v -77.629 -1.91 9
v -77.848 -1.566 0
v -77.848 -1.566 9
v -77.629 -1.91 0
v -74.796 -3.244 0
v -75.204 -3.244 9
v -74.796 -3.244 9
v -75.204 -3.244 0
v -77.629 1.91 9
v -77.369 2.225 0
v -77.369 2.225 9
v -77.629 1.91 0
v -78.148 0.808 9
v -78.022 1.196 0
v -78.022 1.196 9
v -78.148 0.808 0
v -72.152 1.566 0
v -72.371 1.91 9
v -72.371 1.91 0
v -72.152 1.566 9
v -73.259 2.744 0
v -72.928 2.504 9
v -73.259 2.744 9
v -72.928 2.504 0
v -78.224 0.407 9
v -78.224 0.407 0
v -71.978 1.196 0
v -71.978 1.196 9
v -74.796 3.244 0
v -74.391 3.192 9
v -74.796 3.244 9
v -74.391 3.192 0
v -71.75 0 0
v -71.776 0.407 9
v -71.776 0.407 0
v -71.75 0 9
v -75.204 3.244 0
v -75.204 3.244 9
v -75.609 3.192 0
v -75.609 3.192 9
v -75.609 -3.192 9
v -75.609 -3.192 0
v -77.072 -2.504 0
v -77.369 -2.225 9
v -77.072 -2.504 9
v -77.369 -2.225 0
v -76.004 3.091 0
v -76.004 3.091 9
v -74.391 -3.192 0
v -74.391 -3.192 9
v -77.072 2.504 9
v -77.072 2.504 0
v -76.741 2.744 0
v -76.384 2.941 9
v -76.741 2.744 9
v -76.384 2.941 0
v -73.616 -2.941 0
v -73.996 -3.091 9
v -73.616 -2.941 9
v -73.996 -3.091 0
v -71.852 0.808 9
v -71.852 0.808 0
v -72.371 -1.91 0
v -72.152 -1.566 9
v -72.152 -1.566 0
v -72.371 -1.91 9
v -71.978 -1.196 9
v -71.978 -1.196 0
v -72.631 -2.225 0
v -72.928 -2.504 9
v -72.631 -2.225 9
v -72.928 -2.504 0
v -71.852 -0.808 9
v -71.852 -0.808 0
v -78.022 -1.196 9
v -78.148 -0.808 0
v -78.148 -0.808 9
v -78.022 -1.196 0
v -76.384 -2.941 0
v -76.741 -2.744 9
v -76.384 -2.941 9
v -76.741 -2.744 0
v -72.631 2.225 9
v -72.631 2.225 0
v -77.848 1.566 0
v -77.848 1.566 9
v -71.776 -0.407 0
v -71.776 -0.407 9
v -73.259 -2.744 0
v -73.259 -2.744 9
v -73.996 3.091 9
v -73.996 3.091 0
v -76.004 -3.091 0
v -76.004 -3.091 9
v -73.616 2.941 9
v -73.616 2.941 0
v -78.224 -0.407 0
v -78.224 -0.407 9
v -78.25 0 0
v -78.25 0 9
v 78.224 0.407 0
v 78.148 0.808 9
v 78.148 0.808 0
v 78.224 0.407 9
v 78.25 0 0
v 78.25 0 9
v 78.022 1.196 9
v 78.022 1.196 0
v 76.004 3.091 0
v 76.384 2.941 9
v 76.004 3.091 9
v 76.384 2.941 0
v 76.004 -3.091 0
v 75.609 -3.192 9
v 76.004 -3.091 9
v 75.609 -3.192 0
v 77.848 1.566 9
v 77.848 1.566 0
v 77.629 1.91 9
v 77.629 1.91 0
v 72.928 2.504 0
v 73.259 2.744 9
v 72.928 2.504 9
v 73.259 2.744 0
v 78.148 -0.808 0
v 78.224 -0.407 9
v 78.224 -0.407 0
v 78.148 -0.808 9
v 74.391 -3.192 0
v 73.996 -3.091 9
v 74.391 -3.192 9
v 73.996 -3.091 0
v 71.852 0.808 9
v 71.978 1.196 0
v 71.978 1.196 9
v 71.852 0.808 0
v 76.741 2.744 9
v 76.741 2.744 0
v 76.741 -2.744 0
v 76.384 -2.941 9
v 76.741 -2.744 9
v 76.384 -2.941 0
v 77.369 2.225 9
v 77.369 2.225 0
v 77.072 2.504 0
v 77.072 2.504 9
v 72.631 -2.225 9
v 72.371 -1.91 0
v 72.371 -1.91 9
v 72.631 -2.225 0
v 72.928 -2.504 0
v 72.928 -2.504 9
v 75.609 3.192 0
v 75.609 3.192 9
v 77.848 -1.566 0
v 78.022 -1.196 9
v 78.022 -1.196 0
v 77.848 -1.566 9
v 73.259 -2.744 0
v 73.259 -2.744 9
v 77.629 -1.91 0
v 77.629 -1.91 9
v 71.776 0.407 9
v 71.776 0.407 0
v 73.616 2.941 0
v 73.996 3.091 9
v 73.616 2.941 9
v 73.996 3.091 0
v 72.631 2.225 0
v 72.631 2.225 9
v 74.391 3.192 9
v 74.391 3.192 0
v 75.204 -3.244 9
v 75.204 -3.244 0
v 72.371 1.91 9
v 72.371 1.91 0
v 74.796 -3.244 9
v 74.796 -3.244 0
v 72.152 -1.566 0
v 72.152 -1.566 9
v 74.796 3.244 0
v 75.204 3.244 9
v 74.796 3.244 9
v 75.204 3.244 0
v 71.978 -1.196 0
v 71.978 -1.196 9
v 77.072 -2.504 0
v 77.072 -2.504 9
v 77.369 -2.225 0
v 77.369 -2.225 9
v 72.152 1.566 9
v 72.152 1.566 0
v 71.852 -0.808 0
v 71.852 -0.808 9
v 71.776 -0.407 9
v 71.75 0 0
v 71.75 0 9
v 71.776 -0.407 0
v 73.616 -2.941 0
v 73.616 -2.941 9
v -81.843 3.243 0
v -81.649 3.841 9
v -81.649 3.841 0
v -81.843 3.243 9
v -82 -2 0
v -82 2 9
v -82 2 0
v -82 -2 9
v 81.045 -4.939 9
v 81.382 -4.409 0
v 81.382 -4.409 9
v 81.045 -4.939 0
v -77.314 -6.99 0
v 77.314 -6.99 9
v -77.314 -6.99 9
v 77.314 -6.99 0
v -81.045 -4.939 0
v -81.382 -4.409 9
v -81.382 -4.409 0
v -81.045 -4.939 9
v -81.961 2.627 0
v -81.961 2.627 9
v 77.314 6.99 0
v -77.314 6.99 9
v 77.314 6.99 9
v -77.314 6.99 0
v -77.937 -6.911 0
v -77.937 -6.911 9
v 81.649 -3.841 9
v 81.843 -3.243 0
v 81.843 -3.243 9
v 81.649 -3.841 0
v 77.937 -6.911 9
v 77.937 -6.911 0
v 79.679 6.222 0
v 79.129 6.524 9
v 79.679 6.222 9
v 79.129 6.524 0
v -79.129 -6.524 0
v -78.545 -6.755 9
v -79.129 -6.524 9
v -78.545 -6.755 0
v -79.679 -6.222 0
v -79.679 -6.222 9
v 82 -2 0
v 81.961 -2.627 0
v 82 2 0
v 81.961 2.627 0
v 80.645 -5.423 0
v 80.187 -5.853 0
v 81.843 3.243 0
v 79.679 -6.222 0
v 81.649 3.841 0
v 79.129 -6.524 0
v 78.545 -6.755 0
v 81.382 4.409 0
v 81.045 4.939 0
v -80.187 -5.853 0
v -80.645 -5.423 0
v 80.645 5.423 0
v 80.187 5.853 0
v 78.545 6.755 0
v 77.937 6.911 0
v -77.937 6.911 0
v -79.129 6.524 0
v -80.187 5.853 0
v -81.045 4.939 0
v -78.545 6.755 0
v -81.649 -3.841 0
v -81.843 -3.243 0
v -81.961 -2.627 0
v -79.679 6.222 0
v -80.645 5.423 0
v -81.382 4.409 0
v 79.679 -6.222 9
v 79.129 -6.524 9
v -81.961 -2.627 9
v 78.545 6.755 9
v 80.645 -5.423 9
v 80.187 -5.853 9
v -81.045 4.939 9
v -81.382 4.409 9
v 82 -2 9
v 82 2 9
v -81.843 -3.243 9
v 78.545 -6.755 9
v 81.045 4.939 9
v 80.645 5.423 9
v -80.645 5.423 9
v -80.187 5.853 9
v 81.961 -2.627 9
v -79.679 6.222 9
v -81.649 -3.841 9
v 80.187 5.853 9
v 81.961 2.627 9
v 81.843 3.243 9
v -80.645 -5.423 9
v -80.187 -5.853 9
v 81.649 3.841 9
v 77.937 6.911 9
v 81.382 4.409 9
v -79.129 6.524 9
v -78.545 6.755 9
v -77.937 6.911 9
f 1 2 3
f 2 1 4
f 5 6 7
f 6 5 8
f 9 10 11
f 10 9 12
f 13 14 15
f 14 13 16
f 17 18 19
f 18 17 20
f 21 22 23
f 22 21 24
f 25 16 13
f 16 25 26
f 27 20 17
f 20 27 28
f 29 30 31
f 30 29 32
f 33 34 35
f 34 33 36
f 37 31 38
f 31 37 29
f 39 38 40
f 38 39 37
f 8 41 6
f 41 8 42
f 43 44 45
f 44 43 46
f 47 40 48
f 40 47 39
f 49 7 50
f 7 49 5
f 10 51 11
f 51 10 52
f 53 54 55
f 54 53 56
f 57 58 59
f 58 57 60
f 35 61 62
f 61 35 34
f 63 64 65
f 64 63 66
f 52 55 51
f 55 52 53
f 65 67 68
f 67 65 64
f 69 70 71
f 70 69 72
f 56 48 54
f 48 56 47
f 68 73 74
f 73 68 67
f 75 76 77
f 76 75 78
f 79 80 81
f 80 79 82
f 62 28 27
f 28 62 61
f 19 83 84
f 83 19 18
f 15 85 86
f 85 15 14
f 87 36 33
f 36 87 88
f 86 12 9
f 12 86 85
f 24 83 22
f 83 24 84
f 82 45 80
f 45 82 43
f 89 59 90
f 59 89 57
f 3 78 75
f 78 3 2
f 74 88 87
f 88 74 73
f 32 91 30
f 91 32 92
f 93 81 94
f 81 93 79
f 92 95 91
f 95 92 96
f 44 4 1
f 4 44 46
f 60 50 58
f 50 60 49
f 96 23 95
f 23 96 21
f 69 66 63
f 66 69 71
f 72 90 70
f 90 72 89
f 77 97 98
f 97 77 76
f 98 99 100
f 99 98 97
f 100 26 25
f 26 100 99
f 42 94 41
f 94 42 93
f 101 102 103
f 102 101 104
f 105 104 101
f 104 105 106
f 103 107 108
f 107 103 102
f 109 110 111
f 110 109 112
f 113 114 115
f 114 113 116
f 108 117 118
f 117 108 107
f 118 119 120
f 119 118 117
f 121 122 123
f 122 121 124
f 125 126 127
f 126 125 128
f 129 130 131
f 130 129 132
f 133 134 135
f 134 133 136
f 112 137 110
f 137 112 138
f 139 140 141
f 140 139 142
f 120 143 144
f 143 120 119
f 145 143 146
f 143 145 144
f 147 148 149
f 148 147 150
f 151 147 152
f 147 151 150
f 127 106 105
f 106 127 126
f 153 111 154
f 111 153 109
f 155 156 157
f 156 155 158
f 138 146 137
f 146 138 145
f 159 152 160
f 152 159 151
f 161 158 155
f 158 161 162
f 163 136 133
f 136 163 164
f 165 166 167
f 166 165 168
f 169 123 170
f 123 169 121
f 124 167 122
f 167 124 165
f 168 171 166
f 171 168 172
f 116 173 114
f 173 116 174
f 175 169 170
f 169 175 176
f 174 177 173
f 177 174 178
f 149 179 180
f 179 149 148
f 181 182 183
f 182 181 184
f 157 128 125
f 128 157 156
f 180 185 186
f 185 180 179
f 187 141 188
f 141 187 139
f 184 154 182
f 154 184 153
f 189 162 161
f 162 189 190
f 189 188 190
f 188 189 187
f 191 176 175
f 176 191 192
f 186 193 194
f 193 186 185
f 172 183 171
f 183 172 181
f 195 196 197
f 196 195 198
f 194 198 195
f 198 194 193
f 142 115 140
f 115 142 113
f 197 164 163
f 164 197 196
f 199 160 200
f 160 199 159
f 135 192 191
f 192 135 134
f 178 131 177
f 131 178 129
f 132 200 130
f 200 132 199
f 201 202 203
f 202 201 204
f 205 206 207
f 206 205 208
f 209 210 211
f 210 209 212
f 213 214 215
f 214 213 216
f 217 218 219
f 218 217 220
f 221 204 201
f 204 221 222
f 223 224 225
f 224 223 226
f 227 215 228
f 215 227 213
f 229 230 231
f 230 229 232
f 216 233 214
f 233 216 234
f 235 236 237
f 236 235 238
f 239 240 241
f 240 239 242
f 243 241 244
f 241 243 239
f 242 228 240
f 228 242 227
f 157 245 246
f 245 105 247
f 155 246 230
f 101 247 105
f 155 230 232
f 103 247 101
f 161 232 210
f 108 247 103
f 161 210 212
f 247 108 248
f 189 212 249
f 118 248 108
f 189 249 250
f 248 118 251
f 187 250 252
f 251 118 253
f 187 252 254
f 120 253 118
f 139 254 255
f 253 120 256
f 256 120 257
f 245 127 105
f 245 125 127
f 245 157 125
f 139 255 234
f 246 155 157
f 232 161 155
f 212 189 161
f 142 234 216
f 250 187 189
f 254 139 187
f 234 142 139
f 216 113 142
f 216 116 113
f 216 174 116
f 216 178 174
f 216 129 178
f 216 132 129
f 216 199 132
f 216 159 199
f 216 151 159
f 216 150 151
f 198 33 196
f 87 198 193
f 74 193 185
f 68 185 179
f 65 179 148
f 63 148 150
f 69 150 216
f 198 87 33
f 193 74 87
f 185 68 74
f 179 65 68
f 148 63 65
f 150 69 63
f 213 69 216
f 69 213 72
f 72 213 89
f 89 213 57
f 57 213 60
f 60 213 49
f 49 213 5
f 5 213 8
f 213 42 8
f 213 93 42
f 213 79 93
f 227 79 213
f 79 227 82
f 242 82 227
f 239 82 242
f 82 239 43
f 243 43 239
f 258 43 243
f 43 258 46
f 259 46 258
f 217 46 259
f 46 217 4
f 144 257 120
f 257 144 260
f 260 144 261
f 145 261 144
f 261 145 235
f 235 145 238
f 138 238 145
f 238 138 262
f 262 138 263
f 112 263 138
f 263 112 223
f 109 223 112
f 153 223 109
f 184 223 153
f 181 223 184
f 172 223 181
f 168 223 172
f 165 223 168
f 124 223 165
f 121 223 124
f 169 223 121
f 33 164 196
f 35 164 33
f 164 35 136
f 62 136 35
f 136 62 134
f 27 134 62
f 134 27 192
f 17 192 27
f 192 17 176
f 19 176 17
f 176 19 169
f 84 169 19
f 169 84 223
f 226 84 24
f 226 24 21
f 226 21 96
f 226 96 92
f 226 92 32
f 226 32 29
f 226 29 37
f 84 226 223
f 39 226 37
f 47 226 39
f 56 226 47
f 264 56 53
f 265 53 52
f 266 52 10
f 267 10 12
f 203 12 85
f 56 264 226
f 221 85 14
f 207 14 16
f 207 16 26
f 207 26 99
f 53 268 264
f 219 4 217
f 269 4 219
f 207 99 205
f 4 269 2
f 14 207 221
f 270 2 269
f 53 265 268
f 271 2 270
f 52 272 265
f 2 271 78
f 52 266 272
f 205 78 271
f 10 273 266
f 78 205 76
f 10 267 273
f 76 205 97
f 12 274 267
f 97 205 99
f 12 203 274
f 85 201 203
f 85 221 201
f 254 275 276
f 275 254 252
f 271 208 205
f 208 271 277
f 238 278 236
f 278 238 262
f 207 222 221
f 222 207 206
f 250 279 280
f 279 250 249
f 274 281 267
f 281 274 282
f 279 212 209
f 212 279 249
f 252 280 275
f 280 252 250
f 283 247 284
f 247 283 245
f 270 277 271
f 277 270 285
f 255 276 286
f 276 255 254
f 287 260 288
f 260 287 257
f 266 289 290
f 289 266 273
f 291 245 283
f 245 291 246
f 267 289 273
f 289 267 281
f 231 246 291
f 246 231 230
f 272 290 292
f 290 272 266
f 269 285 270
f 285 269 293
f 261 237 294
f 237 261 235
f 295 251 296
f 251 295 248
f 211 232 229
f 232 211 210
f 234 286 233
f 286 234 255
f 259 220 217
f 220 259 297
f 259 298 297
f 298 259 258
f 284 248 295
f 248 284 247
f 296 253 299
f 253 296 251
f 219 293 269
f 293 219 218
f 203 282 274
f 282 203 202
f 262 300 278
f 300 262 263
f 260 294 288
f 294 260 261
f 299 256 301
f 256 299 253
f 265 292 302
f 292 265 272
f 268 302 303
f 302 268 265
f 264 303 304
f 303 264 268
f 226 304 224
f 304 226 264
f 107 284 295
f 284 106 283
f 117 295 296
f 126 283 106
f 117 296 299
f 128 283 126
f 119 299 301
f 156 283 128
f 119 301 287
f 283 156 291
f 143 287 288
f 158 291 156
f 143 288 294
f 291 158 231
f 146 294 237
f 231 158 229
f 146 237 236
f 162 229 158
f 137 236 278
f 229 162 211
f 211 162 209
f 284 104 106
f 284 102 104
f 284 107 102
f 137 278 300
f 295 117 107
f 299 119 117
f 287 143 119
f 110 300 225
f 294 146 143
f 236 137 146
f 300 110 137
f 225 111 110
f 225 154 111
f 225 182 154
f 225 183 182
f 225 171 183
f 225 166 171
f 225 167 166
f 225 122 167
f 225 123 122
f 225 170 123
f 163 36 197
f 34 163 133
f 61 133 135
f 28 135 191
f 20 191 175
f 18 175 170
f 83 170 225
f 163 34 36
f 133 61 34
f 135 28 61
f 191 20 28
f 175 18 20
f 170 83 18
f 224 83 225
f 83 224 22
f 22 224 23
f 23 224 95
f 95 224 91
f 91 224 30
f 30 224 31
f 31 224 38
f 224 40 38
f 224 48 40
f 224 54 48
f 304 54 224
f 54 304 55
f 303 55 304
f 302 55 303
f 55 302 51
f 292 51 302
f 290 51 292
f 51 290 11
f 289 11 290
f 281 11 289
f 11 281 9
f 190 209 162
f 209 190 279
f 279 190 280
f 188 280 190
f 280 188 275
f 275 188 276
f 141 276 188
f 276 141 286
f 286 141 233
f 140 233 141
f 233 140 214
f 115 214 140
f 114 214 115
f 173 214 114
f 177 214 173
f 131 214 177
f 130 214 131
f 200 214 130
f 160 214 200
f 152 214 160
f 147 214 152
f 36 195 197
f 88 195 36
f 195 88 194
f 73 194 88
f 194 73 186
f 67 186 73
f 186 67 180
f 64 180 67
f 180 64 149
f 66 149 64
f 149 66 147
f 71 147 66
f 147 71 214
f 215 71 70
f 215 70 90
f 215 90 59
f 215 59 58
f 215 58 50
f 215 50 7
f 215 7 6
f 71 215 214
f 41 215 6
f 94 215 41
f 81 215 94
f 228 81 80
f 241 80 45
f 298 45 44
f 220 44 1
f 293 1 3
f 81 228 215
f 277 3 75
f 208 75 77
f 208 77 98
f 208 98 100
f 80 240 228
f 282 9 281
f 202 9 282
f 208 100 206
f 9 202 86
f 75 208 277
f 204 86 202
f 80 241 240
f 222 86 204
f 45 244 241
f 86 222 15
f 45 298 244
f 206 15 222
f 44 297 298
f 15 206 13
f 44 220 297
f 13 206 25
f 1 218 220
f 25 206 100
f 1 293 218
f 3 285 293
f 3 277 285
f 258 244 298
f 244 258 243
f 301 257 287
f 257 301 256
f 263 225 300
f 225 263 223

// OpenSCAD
$fn = 50;


difference() {
	union() {
		hull() {
			translate(v = [-77.0000000000, 2.0000000000, 0]) {
				cylinder(h = 9, r = 5);
			}
			translate(v = [77.0000000000, 2.0000000000, 0]) {
				cylinder(h = 9, r = 5);
			}
			translate(v = [-77.0000000000, -2.0000000000, 0]) {
				cylinder(h = 9, r = 5);
			}
			translate(v = [77.0000000000, -2.0000000000, 0]) {
				cylinder(h = 9, r = 5);
			}
		}
	}
	union() {
		translate(v = [-75.0000000000, 0.0000000000, -100.0000000000]) {
			cylinder(h = 200, r = 3.2500000000);
		}
		translate(v = [-75.0000000000, 0.0000000000, -100.0000000000]) {
			cylinder(h = 200, r = 3.2500000000);
		}
		translate(v = [75.0000000000, 0.0000000000, -100.0000000000]) {
			cylinder(h = 200, r = 3.2500000000);
		}
		translate(v = [75.0000000000, 0.0000000000, -100.0000000000]) {
			cylinder(h = 200, r = 3.2500000000);
		}
	}
}
